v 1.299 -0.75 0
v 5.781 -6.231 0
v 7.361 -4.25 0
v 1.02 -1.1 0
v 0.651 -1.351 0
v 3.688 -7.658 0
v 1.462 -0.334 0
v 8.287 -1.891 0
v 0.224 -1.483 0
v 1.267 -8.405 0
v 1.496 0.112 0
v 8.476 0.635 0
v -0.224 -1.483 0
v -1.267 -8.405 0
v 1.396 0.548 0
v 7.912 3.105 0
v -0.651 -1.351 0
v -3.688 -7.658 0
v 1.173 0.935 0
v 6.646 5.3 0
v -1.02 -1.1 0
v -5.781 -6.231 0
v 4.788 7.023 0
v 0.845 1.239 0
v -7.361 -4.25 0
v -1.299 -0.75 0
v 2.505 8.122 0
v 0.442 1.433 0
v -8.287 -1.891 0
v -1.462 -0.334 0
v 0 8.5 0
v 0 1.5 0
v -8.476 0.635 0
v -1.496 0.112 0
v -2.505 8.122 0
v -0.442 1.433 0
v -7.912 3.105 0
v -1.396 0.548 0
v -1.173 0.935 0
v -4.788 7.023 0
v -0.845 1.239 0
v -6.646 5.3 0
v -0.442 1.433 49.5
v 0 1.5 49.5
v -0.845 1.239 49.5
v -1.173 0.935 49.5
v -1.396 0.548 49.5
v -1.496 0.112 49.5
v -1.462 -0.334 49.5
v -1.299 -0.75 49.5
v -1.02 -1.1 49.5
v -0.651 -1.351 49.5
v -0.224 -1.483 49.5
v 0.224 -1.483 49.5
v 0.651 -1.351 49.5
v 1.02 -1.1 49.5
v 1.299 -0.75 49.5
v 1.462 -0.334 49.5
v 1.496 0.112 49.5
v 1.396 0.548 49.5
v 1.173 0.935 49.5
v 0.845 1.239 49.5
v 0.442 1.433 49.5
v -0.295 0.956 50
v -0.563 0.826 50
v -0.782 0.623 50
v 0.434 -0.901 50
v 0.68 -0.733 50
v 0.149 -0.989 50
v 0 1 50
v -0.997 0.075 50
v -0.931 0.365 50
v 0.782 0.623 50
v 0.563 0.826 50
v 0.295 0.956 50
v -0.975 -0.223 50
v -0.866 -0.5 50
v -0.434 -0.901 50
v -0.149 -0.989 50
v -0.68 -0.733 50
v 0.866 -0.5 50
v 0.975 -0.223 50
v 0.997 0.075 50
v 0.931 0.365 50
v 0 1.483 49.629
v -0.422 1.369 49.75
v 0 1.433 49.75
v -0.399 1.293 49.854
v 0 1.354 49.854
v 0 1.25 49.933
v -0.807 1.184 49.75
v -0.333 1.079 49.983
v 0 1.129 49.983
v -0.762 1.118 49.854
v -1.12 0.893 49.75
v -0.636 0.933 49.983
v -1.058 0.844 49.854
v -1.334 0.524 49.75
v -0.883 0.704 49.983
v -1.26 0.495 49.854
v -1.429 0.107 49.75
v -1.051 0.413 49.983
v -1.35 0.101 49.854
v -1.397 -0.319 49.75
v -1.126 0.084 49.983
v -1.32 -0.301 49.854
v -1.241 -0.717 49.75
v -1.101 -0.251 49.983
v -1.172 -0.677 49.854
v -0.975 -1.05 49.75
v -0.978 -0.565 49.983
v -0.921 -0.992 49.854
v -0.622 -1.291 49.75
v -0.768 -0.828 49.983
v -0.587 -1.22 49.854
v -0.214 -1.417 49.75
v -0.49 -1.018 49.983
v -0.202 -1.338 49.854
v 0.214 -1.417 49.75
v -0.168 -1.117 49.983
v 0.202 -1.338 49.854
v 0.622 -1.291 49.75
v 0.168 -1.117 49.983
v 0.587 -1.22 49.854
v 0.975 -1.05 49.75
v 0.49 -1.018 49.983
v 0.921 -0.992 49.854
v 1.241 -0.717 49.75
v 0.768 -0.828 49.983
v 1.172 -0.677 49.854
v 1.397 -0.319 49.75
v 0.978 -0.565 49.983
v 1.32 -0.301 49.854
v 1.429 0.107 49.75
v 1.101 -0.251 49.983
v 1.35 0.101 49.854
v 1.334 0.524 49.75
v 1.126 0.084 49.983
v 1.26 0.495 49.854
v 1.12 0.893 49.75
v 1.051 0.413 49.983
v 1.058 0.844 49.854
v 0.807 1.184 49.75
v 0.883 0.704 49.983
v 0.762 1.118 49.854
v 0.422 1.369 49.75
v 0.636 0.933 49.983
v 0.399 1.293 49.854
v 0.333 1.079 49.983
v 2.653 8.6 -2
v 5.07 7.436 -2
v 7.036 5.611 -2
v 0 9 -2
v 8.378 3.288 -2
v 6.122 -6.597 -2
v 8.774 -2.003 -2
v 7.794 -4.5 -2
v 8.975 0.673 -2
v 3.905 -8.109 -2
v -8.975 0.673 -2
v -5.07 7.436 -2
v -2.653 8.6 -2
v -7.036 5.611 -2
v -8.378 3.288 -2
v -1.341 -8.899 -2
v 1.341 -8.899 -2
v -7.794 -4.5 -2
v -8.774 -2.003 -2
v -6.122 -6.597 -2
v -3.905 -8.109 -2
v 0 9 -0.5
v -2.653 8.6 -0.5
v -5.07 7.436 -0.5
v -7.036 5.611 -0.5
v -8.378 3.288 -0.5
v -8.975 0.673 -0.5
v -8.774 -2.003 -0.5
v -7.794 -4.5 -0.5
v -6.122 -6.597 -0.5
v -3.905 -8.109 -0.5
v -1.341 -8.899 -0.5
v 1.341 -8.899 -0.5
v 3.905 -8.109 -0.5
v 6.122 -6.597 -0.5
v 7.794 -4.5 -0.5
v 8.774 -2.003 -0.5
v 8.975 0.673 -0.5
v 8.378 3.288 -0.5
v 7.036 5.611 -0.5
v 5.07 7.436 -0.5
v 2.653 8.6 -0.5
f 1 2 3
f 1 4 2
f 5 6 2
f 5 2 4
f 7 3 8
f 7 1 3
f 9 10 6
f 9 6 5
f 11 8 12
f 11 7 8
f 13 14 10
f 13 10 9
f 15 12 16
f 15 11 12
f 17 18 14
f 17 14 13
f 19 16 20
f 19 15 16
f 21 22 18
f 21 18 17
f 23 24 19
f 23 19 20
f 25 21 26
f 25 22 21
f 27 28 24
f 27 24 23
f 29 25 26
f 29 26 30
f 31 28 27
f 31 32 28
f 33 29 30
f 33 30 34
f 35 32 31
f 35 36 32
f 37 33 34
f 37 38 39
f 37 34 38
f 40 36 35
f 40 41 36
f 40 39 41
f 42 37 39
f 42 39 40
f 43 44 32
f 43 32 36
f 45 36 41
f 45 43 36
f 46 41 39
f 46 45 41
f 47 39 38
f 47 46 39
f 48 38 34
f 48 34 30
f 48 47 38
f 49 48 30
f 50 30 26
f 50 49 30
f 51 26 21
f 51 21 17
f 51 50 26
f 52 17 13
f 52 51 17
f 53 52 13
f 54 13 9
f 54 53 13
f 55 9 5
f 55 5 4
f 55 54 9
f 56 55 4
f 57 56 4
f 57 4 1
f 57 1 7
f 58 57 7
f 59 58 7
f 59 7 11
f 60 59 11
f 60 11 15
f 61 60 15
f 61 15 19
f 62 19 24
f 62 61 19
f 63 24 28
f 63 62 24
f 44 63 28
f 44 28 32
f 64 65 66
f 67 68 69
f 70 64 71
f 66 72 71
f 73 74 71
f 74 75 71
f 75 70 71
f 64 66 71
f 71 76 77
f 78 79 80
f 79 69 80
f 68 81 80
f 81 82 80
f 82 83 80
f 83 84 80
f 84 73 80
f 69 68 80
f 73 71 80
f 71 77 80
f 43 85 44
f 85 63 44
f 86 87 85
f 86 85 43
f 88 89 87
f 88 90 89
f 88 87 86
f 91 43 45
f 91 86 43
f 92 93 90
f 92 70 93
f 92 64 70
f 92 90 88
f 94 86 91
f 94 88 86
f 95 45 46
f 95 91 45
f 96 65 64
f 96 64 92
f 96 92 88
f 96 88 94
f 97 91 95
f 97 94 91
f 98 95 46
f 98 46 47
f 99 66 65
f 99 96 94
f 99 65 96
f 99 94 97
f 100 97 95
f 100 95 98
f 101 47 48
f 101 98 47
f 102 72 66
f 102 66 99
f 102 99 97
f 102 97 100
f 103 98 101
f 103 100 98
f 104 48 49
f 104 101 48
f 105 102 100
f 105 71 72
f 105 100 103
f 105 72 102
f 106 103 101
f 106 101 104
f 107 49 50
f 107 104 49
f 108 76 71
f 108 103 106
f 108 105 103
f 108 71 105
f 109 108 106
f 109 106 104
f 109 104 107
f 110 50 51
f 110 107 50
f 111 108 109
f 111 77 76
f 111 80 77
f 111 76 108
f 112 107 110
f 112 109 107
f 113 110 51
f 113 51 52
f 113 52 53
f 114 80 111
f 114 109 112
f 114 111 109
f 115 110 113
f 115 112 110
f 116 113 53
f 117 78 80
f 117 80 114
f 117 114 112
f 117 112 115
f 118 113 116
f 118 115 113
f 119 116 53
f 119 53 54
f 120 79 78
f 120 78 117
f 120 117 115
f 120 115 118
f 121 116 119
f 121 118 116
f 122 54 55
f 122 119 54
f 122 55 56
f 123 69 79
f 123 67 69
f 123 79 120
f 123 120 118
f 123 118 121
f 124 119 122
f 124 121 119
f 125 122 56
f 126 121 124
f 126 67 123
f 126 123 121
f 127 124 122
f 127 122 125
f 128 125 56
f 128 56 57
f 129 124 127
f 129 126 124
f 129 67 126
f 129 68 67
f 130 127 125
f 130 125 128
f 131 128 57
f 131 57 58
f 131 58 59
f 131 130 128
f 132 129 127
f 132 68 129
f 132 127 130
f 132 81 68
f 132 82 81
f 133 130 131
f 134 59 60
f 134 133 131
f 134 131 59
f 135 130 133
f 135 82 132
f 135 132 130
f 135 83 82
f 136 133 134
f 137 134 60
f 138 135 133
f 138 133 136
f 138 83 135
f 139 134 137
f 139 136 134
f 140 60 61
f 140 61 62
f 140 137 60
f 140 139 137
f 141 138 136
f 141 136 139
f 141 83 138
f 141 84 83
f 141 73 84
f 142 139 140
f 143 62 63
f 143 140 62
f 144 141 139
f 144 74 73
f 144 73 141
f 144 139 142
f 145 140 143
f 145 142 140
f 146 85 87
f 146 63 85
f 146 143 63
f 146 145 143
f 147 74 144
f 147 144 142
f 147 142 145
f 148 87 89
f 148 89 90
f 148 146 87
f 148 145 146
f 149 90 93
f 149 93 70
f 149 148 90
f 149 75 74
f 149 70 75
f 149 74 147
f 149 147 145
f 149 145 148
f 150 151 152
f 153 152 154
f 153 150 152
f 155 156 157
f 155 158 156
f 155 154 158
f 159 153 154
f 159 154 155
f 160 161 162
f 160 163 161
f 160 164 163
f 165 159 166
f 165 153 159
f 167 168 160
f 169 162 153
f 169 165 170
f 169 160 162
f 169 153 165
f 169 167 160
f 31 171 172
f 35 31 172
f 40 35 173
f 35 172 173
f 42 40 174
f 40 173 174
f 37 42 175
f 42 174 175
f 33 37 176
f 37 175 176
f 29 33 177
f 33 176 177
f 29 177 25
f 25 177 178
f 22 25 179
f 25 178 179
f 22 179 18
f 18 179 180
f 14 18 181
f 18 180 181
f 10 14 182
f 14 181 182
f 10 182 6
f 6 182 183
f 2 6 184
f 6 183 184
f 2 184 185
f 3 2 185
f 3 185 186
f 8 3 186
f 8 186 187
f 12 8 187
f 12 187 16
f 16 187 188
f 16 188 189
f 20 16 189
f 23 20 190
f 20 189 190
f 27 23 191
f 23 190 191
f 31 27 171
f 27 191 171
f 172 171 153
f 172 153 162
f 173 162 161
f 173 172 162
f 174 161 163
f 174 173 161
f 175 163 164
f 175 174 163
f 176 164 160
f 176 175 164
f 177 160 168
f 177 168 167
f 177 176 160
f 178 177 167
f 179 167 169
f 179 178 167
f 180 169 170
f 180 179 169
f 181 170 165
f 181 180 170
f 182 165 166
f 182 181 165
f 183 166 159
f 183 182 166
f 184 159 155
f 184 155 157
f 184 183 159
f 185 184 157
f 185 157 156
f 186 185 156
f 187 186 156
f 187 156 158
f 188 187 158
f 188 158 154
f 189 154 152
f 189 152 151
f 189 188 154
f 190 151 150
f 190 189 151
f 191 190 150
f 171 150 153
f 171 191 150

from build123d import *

# Parameters (mm, degrees)
FILLET1_R     = 0.5
CHAMFER1_SIZE = 0.5


with BuildPart() as part:
    # Sketch1 → Revolve1 (revolve)
    with BuildSketch(Plane.YZ):
        Polygon((0, 50), (0, -2), (9, -2), (9, 0), (1.5, 0), (1.5, 50), align=None)
    revolve(axis=Axis((0, 0, -11.370061245), (0, 0, 1)))

    # Fillet1
    fillet1_edges = [part.edges().sort_by_distance(p)[0] for p in [
        (0, -1.5, 50),
    ]]
    fillet(fillet1_edges, radius=FILLET1_R)

    # Chamfer1
    chamfer1_edges = [part.edges().sort_by_distance(p)[0] for p in [
        (0, -9, 0),
    ]]
    chamfer(chamfer1_edges, length=CHAMFER1_SIZE)


solid = part.part
